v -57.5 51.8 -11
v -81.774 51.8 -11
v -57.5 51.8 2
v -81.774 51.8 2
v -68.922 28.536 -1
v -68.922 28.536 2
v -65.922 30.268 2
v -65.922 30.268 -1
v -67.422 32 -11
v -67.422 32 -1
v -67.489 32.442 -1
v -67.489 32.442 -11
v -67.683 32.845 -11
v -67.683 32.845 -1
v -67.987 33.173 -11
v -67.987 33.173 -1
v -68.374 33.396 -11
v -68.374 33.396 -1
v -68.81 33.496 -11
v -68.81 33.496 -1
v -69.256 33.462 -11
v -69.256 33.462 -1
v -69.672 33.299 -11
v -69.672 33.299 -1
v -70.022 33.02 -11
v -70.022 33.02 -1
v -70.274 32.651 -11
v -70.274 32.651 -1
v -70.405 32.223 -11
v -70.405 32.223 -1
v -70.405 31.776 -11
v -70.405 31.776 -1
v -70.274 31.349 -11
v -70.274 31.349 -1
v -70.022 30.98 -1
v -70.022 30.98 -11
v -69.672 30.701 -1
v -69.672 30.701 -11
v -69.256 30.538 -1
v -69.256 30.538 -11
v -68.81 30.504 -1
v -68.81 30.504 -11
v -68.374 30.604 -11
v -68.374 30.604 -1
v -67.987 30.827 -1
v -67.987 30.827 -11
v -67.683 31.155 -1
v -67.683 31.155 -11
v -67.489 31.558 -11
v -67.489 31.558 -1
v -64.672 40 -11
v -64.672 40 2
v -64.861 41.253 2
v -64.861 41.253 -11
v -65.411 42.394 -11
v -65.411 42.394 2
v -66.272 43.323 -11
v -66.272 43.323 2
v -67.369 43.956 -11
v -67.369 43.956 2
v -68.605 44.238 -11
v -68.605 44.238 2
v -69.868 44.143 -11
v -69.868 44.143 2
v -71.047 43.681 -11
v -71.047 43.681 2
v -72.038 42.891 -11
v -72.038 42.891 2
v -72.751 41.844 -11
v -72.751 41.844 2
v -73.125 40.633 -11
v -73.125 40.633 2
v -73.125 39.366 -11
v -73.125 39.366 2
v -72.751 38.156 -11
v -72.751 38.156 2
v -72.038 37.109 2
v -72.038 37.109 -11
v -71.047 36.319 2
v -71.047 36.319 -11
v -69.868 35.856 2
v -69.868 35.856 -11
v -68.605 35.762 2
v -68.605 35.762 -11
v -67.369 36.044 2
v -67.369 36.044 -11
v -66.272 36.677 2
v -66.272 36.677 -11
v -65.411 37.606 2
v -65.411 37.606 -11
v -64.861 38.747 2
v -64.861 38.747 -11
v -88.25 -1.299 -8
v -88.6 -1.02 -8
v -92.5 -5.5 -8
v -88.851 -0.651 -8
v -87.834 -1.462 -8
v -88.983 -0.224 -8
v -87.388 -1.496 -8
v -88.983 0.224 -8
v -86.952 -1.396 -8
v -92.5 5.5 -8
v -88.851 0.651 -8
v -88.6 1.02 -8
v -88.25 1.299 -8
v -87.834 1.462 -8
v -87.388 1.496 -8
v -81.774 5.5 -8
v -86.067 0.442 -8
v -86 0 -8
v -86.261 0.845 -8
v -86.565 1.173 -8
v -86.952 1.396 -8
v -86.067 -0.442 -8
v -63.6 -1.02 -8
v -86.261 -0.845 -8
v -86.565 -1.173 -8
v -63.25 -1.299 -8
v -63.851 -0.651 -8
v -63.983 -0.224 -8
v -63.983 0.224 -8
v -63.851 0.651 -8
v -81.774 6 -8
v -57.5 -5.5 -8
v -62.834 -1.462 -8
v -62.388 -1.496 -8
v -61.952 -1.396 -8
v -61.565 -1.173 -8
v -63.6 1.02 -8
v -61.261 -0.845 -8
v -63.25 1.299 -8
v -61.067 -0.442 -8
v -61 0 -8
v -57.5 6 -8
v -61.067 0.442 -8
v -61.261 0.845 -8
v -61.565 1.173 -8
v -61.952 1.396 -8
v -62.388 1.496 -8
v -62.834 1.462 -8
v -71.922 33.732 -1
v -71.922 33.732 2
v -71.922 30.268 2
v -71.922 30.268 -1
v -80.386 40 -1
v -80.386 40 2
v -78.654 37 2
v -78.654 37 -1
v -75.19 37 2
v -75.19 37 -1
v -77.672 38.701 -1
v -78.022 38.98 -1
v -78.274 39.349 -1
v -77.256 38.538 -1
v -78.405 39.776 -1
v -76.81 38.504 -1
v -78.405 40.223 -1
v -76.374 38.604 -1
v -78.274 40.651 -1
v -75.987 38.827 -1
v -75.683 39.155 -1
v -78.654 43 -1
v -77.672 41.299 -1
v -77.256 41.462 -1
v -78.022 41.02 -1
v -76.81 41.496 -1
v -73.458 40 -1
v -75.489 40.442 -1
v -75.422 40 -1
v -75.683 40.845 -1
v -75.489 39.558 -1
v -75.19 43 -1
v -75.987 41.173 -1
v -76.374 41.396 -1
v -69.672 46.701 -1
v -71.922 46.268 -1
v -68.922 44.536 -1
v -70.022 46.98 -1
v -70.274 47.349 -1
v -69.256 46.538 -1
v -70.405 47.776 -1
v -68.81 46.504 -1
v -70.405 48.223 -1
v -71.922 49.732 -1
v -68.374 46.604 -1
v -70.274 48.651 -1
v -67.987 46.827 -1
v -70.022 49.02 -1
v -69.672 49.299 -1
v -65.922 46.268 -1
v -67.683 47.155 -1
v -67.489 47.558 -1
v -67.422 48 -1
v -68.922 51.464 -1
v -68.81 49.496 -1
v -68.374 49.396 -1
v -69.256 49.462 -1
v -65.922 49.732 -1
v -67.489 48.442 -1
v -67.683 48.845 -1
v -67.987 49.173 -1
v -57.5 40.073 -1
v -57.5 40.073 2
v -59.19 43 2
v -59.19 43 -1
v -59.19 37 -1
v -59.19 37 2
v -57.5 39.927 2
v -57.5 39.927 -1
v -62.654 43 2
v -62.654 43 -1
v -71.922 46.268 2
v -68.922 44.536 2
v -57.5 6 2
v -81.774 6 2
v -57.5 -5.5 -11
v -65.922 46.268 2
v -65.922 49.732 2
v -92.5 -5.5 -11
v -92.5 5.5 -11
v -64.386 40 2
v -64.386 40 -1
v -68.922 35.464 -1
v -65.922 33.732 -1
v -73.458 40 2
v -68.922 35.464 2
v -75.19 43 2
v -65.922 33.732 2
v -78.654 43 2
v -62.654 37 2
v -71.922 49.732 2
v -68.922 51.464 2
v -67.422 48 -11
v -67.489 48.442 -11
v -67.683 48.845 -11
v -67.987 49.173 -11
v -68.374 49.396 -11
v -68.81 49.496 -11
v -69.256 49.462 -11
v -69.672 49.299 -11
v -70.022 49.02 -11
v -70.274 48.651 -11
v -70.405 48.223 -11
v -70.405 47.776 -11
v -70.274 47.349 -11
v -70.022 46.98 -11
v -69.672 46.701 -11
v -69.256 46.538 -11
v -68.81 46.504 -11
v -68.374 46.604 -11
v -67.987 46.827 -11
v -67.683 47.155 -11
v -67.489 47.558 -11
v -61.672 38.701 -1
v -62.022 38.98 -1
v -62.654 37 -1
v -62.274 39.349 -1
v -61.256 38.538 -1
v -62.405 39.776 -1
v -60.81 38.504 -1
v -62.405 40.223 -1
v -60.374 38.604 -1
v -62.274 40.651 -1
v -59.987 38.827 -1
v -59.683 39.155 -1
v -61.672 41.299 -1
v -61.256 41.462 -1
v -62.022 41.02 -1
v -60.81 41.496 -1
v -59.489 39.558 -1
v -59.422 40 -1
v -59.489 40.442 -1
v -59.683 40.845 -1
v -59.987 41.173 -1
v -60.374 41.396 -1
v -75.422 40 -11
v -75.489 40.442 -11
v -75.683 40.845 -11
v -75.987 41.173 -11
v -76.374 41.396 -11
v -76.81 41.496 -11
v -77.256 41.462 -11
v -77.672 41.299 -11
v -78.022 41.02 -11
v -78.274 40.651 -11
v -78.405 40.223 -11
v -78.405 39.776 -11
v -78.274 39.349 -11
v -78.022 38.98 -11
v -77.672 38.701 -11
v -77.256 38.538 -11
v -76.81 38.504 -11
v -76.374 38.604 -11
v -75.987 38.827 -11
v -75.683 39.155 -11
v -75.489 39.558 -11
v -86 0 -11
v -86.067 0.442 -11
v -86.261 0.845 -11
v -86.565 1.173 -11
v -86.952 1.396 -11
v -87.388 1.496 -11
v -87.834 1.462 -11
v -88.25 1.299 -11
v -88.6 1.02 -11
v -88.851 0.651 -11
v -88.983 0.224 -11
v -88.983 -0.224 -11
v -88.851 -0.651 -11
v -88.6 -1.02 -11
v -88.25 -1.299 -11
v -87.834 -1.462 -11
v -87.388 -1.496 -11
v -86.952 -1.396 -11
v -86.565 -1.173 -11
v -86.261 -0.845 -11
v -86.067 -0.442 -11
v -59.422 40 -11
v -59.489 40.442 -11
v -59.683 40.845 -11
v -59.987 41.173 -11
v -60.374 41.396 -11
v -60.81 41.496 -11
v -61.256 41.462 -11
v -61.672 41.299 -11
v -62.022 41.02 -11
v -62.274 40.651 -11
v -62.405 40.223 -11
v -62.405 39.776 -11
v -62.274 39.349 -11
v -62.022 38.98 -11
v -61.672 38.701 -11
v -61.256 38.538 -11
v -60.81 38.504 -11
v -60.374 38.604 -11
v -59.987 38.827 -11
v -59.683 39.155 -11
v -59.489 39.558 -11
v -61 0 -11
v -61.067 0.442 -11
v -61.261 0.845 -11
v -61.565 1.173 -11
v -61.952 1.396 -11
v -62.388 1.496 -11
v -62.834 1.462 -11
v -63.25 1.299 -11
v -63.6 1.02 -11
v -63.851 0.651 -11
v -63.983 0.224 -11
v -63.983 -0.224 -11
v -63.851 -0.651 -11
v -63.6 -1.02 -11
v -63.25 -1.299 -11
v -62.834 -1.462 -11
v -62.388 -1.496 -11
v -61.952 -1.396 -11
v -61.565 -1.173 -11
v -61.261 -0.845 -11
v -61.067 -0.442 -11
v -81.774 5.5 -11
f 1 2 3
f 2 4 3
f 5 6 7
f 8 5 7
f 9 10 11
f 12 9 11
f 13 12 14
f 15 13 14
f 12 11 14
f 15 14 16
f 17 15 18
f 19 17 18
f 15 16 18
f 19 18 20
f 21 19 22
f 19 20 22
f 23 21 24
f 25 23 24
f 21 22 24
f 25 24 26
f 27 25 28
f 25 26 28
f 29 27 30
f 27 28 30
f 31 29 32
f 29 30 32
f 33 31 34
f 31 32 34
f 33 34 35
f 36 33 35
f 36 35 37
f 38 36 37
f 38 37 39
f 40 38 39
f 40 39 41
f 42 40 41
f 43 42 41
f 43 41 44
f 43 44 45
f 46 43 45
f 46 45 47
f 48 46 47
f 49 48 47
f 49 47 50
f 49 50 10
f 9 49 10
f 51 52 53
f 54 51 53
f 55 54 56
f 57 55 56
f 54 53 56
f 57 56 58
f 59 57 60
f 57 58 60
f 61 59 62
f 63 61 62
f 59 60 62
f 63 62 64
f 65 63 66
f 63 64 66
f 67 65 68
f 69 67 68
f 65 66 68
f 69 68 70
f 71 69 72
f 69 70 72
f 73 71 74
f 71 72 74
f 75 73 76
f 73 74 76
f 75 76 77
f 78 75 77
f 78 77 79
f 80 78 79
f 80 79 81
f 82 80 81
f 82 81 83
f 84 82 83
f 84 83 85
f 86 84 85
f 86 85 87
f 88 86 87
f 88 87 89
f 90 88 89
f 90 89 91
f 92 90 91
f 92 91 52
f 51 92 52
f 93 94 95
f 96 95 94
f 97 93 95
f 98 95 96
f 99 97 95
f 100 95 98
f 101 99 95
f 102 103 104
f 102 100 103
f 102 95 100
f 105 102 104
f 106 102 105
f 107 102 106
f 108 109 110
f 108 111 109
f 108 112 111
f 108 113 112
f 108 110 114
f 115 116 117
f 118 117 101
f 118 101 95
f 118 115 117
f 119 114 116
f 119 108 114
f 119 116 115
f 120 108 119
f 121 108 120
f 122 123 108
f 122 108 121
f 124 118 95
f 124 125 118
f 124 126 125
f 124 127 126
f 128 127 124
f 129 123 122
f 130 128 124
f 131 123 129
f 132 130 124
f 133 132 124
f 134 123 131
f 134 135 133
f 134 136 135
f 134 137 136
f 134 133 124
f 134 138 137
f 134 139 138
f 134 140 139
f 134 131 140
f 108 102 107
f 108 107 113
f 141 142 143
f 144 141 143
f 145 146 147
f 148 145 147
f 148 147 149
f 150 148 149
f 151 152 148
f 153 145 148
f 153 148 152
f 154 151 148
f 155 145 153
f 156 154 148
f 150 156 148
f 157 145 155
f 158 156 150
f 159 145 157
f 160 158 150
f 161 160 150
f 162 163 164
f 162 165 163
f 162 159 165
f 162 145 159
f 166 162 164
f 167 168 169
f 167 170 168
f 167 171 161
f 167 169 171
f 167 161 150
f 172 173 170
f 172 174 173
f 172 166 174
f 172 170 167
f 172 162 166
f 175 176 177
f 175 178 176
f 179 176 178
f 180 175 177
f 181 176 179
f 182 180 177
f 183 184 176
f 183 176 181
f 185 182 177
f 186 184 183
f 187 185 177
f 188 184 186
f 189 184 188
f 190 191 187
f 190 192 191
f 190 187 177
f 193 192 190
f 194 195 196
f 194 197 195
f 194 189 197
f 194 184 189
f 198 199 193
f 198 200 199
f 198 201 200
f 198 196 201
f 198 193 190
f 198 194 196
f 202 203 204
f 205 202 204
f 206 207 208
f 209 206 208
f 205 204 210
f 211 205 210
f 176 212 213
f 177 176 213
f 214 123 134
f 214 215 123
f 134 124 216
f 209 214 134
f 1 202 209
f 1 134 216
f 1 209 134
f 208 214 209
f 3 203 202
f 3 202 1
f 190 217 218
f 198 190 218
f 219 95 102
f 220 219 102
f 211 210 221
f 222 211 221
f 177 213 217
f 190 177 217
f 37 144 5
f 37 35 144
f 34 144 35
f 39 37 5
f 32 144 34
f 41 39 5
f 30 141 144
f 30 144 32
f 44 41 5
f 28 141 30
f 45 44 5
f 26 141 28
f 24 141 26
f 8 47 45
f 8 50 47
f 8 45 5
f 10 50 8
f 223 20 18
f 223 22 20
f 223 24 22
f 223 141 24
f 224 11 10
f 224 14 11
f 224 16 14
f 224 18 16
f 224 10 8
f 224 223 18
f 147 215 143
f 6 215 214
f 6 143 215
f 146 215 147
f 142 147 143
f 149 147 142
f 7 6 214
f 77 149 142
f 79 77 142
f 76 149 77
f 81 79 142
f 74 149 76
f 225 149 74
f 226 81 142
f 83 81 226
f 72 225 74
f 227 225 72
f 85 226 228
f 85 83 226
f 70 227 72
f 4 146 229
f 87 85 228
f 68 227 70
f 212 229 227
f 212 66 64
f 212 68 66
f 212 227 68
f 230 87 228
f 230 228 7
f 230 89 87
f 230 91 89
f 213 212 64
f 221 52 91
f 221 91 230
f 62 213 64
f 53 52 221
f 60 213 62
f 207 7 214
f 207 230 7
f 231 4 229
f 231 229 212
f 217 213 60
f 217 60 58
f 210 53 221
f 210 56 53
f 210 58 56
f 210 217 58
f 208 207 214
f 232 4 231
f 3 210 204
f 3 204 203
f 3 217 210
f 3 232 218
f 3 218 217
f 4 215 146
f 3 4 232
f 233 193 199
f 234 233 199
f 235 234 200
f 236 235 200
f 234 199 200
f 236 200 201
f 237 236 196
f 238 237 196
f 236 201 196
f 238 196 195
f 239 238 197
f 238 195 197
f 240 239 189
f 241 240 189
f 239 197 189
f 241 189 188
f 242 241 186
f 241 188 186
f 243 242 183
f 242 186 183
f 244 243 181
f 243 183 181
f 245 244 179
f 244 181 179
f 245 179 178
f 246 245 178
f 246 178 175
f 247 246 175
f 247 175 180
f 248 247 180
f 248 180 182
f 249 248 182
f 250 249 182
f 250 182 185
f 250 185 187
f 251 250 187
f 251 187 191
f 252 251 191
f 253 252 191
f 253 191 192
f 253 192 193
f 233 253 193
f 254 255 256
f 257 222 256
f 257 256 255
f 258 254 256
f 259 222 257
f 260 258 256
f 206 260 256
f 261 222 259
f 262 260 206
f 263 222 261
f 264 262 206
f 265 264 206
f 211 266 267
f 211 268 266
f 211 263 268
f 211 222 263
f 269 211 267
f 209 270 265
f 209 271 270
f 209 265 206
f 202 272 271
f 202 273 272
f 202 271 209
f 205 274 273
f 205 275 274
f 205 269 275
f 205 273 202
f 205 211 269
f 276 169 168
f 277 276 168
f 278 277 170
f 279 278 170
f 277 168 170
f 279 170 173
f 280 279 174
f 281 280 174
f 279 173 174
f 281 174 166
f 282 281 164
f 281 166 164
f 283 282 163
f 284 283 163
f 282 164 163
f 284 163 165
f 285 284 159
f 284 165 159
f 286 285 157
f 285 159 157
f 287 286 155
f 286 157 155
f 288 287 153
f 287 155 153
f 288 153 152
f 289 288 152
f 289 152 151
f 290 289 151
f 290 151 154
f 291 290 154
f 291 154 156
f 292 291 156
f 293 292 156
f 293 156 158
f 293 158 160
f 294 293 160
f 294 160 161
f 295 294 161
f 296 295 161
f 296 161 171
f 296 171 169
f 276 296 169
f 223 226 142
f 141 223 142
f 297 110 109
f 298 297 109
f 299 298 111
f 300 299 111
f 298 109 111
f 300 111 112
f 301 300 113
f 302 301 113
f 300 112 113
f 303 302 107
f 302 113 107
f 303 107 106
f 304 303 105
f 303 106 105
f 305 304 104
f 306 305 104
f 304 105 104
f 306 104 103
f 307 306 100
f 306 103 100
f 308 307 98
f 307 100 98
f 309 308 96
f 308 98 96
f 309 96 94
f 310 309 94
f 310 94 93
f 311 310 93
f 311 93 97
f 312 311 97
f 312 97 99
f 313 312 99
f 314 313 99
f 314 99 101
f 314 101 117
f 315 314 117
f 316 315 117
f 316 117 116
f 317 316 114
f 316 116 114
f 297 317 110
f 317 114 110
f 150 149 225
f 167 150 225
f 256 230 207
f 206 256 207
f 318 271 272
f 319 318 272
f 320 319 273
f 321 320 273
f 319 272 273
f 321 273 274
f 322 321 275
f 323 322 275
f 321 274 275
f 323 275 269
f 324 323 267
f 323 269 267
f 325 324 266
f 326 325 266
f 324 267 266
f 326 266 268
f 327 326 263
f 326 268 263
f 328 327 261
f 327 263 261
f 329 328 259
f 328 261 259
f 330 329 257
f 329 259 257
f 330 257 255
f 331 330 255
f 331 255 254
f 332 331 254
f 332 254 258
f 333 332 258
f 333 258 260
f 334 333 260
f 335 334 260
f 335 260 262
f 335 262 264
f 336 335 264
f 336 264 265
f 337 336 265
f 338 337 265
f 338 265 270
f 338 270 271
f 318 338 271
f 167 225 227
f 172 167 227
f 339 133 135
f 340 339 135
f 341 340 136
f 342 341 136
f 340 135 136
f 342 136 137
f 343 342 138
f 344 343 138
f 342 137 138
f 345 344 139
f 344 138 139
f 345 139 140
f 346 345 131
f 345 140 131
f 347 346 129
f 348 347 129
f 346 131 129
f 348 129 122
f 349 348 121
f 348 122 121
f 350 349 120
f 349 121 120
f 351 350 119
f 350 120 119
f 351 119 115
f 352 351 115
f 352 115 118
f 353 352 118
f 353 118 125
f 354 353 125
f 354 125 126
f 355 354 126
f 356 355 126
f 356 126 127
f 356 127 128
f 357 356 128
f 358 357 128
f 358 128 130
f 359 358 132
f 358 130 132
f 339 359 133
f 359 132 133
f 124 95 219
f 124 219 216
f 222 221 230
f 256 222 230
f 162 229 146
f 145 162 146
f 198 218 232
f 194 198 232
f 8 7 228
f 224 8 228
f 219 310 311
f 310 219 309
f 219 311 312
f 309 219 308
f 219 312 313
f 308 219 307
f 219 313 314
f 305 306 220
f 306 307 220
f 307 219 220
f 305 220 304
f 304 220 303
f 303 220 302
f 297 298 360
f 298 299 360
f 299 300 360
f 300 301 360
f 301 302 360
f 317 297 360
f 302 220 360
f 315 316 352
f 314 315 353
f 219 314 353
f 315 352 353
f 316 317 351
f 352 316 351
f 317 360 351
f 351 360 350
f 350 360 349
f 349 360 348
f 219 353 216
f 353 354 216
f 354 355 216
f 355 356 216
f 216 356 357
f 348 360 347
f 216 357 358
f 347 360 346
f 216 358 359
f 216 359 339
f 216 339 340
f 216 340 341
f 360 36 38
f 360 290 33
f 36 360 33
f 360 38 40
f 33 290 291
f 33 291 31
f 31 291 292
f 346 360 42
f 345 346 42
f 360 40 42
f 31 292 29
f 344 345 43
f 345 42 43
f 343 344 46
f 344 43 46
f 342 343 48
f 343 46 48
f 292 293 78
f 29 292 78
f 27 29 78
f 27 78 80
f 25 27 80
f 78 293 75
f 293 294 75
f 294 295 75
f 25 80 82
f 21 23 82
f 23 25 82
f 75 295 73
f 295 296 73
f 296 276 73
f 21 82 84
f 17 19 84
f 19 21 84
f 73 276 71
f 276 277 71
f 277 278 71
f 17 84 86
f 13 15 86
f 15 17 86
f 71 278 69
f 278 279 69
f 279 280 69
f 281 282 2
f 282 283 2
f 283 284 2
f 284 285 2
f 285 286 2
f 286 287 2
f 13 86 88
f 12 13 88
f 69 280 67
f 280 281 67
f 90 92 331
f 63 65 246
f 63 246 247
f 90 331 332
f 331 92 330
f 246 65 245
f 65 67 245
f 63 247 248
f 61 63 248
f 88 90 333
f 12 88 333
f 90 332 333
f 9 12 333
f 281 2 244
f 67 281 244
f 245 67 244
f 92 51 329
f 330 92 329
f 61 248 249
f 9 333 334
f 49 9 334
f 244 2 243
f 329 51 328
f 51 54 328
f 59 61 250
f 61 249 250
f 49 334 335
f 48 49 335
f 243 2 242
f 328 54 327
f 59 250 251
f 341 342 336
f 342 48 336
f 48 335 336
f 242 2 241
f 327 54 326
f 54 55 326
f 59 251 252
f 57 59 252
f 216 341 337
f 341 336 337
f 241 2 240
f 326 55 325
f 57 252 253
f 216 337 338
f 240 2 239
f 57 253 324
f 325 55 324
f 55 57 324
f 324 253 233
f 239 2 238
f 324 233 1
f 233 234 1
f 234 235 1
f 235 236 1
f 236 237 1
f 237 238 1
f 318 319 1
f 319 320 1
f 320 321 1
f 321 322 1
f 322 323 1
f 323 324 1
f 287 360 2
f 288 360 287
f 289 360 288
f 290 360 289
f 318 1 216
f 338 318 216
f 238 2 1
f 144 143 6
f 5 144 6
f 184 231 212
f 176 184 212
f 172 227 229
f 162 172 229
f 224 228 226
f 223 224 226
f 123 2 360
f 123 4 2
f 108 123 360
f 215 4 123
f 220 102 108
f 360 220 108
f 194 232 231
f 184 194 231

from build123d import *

# Parameters (mm, degrees)
SKETCH1_W           = 24.274152736
SKETCH1_H           = 45.799920806
SKETCH1_R           = 4.25
BOSS_EXTRUDE1_DEPTH = 2
SKETCH1_3_W         = 24.274152736
SKETCH1_3_H         = 2
SKETCH1_3_H_2       = 43.799920806
BOSS_EXTRUDE2_DEPTH = 8
BOSS_EXTRUDE3_START = -8
SKETCH1_4_W         = 24.274152736
SKETCH1_4_H         = 43.799920806
SKETCH1_4_W_2       = 10
SKETCH1_4_H_2       = 11
SKETCH1_4_H_3       = 2
SKETCH1_4_W_3       = 14.274152736
SKETCH1_4_R         = 1.5
SKETCH1_4_W_4       = 10.725847264
BOSS_EXTRUDE3_DEPTH = 3
SKETCH1_5_R         = 4.25
BOSS_EXTRUDE4_DEPTH = 11
SKETCH2_R           = 4.25
SKETCH2_R_2         = 1.5
CUT_EXTRUDE1_DEPTH  = 3
SKETCH2_2_R         = 1.5
CUT_EXTRUDE2_DEPTH  = 14


with BuildPart() as part:
    # Sketch1 → Boss-Extrude1 (new body)
    with BuildSketch(Plane.XY):
        with Locations((-69.637076368, 28.899960403)):
            Rectangle(SKETCH1_W, SKETCH1_H)
        with Locations((-68.922189075, 39.999920806)):
            Circle(SKETCH1_R, mode=Mode.SUBTRACT)
    extrude(amount=BOSS_EXTRUDE1_DEPTH)

    # Sketch1<3> → Boss-Extrude2 (add)
    with BuildSketch(Plane.XY):
        with Locations((-69.637076368, 7)):
            Rectangle(SKETCH1_3_W, SKETCH1_3_H)
        with Locations((-69.637076368, 29.899960403)):
            Rectangle(SKETCH1_3_W, SKETCH1_3_H_2)
        Polygon((-61.070225414, 39.999920806), (-64.996207244, 33.199920806), (-72.848170905, 33.199920806), (-76.774152736, 39.999920806), (-72.848170905, 46.799920806), (-64.996207244, 46.799920806), align=None, mode=Mode.SUBTRACT)
    extrude(amount=-BOSS_EXTRUDE2_DEPTH)

    # Sketch1<4> → Boss-Extrude3 (add)
    with BuildSketch(Plane.XY.offset(BOSS_EXTRUDE3_START)):
        with Locations((-69.637076368, 29.899960403)):
            Rectangle(SKETCH1_4_W, SKETCH1_4_H)
        Polygon((-61.070225414, 39.999920806), (-64.996207244, 33.199920806), (-72.848170905, 33.199920806), (-76.774152736, 39.999920806), (-72.848170905, 46.799920806), (-64.996207244, 46.799920806), align=None, mode=Mode.SUBTRACT)
        with Locations((-62.5, 0)):
            Rectangle(SKETCH1_4_W_2, SKETCH1_4_H_2)
        Polygon((-59.035898385, 0), (-60.767949192, 3), (-64.232050808, 3), (-65.964101615, 0), (-64.232050808, -3), (-60.767949192, -3), align=None, mode=Mode.SUBTRACT)
        Polygon((-67.5, 5.5), (-57.5, 5.5), (-57.5, 6), (-81.774152736, 6), (-81.774152736, 5.5), align=None)
        with Locations((-69.637076368, 7)):
            Rectangle(SKETCH1_4_W, SKETCH1_4_H_3)
        with Locations((-74.637076368, 0)):
            Rectangle(SKETCH1_4_W_3, SKETCH1_4_H_2)
        Polygon((-60.767949192, -3), (-59.035898385, 0), (-60.767949192, 3), (-64.232050808, 3), (-65.964101615, 0), (-64.232050808, -3), align=None)
        with Locations((-62.5, 0)):
            Circle(SKETCH1_4_R, mode=Mode.SUBTRACT)
        with Locations((-87.137076368, 0)):
            Rectangle(SKETCH1_4_W_4, SKETCH1_4_H_2)
        Polygon((-90.5, -1.732050808), (-87.5, -3.464101615), (-84.5, -1.732050808), (-84.5, 1.732050808), (-87.5, 3.464101615), (-90.5, 1.732050808), align=None, mode=Mode.SUBTRACT)
        Polygon((-90.5, 1.732050808), (-90.5, -1.732050808), (-87.5, -3.464101615), (-84.5, -1.732050808), (-84.5, 1.732050808), (-87.5, 3.464101615), align=None)
        with Locations((-87.5, 0)):
            Circle(SKETCH1_4_R, mode=Mode.SUBTRACT)
    extrude(amount=-BOSS_EXTRUDE3_DEPTH)

    # Sketch1<5> → Boss-Extrude4 (add)
    with BuildSketch(Plane.XY):
        Polygon((-76.774152736, 39.999920806), (-72.848170905, 33.199920806), (-64.996207244, 33.199920806), (-61.070225414, 39.999920806), (-64.996207244, 46.799920806), (-72.848170905, 46.799920806), align=None)
        with Locations((-68.922189075, 39.999920806)):
            Circle(SKETCH1_5_R, mode=Mode.SUBTRACT)
    extrude(amount=-BOSS_EXTRUDE4_DEPTH)

    # Sketch2 → Cut-Extrude1 (cut)
    with BuildSketch(Plane.XY.offset(2)):
        with Locations((-68.922189075, 39.999920806)):
            Circle(SKETCH2_R)
        Polygon((-73.45808746, 39.999920806), (-75.190138267, 42.999920806), (-78.654239882, 42.999920806), (-80.38629069, 39.999920806), (-78.654239882, 36.999920806), (-75.190138267, 36.999920806), align=None)
        with Locations((-76.922189075, 39.999920806)):
            Circle(SKETCH2_R_2, mode=Mode.SUBTRACT)
        Polygon((-68.922189075, 28.535819191), (-65.922189075, 30.267869999), (-65.922189075, 33.731971614), (-68.922189075, 35.464022422), (-71.922189075, 33.731971614), (-71.922189075, 30.267869999), align=None)
        with Locations((-68.922189075, 31.999920806)):
            Circle(SKETCH2_R_2, mode=Mode.SUBTRACT)
        Polygon((-68.922189075, 44.535819191), (-65.922189075, 46.267869999), (-65.922189075, 49.731971614), (-68.922189075, 51.464022422), (-71.922189075, 49.731971614), (-71.922189075, 46.267869999), align=None)
        with Locations((-68.922189075, 47.999920806)):
            Circle(SKETCH2_R_2, mode=Mode.SUBTRACT)
        Polygon((-64.38629069, 39.999920806), (-62.654239882, 36.999920806), (-59.190138267, 36.999920806), (-57.45808746, 39.999920806), (-59.190138267, 42.999920806), (-62.654239882, 42.999920806), align=None)
        with Locations((-60.922189075, 39.999920806)):
            Circle(SKETCH2_R_2, mode=Mode.SUBTRACT)
    extrude(amount=-CUT_EXTRUDE1_DEPTH, mode=Mode.SUBTRACT)

    # Sketch2<2> → Cut-Extrude2 (cut, through all)
    with BuildSketch(Plane.XY.offset(2)):
        with Locations((-60.922189075, 39.999920806)):
            Circle(SKETCH2_2_R)
        with Locations((-68.922189075, 47.999920806)):
            Circle(SKETCH2_2_R)
        with Locations((-76.922189075, 39.999920806)):
            Circle(SKETCH2_2_R)
        with Locations((-68.922189075, 31.999920806)):
            Circle(SKETCH2_2_R)
    extrude(amount=-CUT_EXTRUDE2_DEPTH, mode=Mode.SUBTRACT)


solid = part.part
